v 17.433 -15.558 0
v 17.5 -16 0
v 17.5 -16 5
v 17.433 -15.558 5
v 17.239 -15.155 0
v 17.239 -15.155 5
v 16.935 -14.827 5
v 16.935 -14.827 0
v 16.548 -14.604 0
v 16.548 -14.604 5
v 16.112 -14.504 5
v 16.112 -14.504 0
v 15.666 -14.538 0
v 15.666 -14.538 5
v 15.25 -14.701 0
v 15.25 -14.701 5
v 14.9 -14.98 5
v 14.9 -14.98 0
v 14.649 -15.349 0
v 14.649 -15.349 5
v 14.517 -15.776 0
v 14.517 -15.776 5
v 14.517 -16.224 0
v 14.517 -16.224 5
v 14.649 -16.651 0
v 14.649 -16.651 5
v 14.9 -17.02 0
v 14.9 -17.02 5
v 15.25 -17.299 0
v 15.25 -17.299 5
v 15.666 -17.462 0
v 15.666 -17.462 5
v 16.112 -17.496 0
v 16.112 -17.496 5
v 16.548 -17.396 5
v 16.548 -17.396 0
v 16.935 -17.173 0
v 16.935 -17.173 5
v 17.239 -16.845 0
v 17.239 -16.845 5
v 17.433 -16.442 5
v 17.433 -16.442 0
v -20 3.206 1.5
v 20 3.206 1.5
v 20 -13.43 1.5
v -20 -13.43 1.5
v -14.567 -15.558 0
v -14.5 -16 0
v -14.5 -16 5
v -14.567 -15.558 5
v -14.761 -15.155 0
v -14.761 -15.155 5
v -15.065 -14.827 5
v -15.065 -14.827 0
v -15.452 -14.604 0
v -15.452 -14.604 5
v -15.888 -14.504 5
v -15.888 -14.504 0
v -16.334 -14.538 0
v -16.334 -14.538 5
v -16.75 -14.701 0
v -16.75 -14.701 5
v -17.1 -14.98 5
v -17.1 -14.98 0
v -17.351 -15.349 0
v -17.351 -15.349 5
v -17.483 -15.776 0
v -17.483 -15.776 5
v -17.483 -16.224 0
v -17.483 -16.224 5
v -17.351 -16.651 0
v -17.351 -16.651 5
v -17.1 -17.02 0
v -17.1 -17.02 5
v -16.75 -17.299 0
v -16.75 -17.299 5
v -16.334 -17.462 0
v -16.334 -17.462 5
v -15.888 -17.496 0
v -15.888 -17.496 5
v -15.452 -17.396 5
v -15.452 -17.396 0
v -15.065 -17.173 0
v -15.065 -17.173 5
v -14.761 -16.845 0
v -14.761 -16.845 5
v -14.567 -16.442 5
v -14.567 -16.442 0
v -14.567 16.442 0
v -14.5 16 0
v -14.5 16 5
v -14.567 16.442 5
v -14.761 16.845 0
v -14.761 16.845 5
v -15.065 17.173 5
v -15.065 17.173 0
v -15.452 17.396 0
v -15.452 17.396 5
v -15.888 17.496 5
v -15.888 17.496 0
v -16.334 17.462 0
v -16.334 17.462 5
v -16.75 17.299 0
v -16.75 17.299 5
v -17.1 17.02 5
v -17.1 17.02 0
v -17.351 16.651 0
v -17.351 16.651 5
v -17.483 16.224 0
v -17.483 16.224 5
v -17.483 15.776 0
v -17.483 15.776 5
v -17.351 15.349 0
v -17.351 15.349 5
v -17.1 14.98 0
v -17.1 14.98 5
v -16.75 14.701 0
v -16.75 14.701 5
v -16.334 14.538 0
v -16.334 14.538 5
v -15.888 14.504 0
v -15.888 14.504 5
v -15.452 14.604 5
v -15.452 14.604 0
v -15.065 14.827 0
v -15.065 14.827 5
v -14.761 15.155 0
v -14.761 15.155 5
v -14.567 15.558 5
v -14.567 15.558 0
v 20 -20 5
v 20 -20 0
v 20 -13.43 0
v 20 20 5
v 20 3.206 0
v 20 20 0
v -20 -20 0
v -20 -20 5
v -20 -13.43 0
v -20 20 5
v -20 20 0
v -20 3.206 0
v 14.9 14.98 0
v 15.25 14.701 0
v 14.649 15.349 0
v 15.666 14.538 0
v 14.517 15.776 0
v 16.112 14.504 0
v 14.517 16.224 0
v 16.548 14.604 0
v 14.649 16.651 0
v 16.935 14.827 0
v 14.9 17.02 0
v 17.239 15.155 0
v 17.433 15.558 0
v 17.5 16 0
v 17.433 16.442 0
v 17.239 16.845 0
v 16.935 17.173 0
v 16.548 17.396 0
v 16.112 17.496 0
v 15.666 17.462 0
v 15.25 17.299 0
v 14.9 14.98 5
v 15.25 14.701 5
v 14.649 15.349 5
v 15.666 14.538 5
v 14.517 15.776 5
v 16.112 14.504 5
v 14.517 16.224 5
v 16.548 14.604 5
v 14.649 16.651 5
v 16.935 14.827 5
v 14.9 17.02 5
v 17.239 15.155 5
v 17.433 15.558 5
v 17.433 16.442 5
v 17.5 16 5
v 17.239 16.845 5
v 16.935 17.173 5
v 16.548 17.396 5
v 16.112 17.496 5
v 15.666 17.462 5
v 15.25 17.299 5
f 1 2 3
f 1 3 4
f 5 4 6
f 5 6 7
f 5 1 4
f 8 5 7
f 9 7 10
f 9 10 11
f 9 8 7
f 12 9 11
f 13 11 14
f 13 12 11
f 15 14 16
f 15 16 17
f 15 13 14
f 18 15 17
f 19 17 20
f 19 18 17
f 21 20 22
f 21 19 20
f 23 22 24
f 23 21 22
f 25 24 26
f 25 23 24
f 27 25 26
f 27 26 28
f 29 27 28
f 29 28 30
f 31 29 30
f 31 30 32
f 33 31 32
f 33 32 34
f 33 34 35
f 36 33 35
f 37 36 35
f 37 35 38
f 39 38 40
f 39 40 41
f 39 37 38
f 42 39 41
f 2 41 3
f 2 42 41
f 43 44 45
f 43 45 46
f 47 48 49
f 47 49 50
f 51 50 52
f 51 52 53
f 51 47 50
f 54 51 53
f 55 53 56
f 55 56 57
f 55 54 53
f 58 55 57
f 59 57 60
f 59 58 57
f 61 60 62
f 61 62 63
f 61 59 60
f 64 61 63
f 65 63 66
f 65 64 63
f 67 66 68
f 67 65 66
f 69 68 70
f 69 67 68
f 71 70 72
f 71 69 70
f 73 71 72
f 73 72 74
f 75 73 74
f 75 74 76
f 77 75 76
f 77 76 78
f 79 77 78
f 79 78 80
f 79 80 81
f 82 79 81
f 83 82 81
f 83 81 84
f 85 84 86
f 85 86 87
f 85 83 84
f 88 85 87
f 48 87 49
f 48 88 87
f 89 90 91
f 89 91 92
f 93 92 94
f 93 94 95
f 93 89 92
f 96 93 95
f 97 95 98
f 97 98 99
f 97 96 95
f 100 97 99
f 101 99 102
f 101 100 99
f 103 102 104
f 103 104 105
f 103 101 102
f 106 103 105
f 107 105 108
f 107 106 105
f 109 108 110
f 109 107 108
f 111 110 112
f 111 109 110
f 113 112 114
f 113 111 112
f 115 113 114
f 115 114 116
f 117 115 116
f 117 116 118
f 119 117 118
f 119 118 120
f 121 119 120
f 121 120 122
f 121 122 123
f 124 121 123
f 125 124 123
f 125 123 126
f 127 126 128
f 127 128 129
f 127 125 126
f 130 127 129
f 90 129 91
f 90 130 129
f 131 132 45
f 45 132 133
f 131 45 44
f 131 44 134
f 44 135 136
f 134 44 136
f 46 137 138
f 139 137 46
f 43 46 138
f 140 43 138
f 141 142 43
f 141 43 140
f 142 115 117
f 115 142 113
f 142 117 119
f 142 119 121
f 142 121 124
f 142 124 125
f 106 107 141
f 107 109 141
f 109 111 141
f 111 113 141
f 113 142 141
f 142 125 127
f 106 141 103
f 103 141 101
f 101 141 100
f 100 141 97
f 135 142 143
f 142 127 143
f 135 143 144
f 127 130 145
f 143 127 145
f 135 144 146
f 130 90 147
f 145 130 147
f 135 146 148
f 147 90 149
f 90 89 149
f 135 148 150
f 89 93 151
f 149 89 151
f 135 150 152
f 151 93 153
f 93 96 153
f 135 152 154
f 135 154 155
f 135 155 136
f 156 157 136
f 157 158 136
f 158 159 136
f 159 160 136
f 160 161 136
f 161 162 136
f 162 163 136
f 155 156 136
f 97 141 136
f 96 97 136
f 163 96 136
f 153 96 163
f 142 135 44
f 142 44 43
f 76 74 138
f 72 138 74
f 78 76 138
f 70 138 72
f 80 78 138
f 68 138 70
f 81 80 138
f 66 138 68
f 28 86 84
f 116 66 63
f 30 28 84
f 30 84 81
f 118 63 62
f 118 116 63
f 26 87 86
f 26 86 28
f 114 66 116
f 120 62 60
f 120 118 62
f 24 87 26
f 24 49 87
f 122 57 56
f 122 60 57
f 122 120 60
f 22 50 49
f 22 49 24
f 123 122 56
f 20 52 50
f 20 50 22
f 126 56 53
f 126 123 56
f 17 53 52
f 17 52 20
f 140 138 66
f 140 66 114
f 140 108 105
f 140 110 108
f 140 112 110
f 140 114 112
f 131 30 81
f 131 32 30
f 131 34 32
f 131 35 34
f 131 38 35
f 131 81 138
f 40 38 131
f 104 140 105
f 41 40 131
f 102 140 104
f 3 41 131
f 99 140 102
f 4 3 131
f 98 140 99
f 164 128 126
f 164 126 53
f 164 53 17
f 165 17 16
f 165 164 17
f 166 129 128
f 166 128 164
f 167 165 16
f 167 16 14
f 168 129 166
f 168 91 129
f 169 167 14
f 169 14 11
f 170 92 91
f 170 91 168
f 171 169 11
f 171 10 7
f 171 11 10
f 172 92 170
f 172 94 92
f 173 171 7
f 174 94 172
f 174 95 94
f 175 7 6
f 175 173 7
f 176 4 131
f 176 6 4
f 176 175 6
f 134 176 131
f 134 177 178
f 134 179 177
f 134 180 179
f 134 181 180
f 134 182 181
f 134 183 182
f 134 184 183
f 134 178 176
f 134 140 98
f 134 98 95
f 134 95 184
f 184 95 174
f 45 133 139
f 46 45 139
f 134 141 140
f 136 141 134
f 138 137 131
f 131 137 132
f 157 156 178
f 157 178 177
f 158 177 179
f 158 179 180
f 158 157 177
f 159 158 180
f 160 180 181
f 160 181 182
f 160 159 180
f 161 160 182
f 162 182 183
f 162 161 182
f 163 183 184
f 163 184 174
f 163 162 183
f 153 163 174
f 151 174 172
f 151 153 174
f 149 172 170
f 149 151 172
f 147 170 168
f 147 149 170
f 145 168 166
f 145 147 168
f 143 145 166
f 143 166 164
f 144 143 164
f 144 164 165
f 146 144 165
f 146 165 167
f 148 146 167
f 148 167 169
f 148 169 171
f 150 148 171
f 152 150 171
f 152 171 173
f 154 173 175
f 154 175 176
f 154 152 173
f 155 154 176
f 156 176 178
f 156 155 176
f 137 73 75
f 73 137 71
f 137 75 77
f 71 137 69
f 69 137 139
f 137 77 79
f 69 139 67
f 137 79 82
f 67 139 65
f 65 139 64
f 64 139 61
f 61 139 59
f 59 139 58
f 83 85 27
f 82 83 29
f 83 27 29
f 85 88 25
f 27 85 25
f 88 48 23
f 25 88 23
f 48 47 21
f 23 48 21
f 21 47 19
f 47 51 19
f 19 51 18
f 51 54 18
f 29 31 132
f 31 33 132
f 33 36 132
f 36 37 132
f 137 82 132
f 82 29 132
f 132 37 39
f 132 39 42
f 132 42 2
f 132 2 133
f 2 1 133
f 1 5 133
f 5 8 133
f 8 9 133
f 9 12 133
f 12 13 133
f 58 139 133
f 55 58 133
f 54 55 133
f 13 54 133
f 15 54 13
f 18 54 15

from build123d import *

# Parameters (mm, degrees)
SKETCH1_W           = 40
SKETCH1_H           = 40
SKETCH1_R           = 1.5
BOSS_EXTRUDE1_DEPTH = 5
SKETCH3_W           = 40
SKETCH3_H           = 16.636061704
CUT_EXTRUDE1_DEPTH  = 1.5


with BuildPart() as part:
    # Sketch1 → Boss-Extrude1 (new body)
    with BuildSketch(Plane.XY):
        Rectangle(SKETCH1_W, SKETCH1_H)
        with Locations((-16, 16)):
            Circle(SKETCH1_R, mode=Mode.SUBTRACT)
        with Locations((16, 16)):
            Circle(SKETCH1_R, mode=Mode.SUBTRACT)
        with Locations((-16, -16)):
            Circle(SKETCH1_R, mode=Mode.SUBTRACT)
        with Locations((16, -16)):
            Circle(SKETCH1_R, mode=Mode.SUBTRACT)
    extrude(amount=BOSS_EXTRUDE1_DEPTH)

    # Sketch3 → Cut-Extrude1 (cut)
    with BuildSketch(Plane(origin=(0, 0, 0), x_dir=(-1, 0, 0), z_dir=(0, 0, -1))):
        with Locations((0, -5.111977567)):
            Rectangle(SKETCH3_W, SKETCH3_H)
    extrude(amount=-CUT_EXTRUDE1_DEPTH, mode=Mode.SUBTRACT)


solid = part.part
